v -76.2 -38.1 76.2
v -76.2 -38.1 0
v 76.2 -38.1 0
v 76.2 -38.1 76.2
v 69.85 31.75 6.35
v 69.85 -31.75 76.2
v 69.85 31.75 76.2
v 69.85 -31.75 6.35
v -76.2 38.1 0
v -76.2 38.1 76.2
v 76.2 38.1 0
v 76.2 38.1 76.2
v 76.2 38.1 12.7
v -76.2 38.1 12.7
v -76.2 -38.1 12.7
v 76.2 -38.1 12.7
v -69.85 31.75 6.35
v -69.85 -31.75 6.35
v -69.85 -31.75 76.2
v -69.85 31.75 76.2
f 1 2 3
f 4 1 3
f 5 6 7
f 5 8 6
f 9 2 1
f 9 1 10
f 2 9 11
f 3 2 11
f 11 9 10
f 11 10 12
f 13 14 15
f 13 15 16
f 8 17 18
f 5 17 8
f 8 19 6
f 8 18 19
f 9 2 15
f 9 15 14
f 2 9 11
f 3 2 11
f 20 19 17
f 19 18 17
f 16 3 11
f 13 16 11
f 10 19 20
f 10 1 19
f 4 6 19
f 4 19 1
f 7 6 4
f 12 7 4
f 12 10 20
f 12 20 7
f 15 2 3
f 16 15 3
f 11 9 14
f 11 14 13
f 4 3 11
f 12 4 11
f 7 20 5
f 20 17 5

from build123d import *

# Parameters (mm, degrees)
F0_W     = 152.4
F0_H     = 76.2
F1_DEPTH = 76.2
F2_T     = -6.35
F3_W     = 152.4
F3_H     = 76.2
F4_DEPTH = 12.7


with BuildPart() as f1:
    # F0 (on Top) → F1 (new body)
    with BuildSketch(Plane.XY):
        Rectangle(F0_W, F0_H)
    extrude(amount=F1_DEPTH)

    # F2
    f2_openings = [f1.faces().sort_by_distance(p)[0] for p in [
        (0, 0, 76.2),
    ]]
    offset(amount=F2_T, openings=f2_openings)


with BuildPart() as f4:
    # F3 (on Top) → F4 (new body)
    with BuildSketch(Plane.XY):
        Rectangle(F3_W, F3_H)
    extrude(amount=F4_DEPTH)


solid = Compound([f1.part, f4.part])
